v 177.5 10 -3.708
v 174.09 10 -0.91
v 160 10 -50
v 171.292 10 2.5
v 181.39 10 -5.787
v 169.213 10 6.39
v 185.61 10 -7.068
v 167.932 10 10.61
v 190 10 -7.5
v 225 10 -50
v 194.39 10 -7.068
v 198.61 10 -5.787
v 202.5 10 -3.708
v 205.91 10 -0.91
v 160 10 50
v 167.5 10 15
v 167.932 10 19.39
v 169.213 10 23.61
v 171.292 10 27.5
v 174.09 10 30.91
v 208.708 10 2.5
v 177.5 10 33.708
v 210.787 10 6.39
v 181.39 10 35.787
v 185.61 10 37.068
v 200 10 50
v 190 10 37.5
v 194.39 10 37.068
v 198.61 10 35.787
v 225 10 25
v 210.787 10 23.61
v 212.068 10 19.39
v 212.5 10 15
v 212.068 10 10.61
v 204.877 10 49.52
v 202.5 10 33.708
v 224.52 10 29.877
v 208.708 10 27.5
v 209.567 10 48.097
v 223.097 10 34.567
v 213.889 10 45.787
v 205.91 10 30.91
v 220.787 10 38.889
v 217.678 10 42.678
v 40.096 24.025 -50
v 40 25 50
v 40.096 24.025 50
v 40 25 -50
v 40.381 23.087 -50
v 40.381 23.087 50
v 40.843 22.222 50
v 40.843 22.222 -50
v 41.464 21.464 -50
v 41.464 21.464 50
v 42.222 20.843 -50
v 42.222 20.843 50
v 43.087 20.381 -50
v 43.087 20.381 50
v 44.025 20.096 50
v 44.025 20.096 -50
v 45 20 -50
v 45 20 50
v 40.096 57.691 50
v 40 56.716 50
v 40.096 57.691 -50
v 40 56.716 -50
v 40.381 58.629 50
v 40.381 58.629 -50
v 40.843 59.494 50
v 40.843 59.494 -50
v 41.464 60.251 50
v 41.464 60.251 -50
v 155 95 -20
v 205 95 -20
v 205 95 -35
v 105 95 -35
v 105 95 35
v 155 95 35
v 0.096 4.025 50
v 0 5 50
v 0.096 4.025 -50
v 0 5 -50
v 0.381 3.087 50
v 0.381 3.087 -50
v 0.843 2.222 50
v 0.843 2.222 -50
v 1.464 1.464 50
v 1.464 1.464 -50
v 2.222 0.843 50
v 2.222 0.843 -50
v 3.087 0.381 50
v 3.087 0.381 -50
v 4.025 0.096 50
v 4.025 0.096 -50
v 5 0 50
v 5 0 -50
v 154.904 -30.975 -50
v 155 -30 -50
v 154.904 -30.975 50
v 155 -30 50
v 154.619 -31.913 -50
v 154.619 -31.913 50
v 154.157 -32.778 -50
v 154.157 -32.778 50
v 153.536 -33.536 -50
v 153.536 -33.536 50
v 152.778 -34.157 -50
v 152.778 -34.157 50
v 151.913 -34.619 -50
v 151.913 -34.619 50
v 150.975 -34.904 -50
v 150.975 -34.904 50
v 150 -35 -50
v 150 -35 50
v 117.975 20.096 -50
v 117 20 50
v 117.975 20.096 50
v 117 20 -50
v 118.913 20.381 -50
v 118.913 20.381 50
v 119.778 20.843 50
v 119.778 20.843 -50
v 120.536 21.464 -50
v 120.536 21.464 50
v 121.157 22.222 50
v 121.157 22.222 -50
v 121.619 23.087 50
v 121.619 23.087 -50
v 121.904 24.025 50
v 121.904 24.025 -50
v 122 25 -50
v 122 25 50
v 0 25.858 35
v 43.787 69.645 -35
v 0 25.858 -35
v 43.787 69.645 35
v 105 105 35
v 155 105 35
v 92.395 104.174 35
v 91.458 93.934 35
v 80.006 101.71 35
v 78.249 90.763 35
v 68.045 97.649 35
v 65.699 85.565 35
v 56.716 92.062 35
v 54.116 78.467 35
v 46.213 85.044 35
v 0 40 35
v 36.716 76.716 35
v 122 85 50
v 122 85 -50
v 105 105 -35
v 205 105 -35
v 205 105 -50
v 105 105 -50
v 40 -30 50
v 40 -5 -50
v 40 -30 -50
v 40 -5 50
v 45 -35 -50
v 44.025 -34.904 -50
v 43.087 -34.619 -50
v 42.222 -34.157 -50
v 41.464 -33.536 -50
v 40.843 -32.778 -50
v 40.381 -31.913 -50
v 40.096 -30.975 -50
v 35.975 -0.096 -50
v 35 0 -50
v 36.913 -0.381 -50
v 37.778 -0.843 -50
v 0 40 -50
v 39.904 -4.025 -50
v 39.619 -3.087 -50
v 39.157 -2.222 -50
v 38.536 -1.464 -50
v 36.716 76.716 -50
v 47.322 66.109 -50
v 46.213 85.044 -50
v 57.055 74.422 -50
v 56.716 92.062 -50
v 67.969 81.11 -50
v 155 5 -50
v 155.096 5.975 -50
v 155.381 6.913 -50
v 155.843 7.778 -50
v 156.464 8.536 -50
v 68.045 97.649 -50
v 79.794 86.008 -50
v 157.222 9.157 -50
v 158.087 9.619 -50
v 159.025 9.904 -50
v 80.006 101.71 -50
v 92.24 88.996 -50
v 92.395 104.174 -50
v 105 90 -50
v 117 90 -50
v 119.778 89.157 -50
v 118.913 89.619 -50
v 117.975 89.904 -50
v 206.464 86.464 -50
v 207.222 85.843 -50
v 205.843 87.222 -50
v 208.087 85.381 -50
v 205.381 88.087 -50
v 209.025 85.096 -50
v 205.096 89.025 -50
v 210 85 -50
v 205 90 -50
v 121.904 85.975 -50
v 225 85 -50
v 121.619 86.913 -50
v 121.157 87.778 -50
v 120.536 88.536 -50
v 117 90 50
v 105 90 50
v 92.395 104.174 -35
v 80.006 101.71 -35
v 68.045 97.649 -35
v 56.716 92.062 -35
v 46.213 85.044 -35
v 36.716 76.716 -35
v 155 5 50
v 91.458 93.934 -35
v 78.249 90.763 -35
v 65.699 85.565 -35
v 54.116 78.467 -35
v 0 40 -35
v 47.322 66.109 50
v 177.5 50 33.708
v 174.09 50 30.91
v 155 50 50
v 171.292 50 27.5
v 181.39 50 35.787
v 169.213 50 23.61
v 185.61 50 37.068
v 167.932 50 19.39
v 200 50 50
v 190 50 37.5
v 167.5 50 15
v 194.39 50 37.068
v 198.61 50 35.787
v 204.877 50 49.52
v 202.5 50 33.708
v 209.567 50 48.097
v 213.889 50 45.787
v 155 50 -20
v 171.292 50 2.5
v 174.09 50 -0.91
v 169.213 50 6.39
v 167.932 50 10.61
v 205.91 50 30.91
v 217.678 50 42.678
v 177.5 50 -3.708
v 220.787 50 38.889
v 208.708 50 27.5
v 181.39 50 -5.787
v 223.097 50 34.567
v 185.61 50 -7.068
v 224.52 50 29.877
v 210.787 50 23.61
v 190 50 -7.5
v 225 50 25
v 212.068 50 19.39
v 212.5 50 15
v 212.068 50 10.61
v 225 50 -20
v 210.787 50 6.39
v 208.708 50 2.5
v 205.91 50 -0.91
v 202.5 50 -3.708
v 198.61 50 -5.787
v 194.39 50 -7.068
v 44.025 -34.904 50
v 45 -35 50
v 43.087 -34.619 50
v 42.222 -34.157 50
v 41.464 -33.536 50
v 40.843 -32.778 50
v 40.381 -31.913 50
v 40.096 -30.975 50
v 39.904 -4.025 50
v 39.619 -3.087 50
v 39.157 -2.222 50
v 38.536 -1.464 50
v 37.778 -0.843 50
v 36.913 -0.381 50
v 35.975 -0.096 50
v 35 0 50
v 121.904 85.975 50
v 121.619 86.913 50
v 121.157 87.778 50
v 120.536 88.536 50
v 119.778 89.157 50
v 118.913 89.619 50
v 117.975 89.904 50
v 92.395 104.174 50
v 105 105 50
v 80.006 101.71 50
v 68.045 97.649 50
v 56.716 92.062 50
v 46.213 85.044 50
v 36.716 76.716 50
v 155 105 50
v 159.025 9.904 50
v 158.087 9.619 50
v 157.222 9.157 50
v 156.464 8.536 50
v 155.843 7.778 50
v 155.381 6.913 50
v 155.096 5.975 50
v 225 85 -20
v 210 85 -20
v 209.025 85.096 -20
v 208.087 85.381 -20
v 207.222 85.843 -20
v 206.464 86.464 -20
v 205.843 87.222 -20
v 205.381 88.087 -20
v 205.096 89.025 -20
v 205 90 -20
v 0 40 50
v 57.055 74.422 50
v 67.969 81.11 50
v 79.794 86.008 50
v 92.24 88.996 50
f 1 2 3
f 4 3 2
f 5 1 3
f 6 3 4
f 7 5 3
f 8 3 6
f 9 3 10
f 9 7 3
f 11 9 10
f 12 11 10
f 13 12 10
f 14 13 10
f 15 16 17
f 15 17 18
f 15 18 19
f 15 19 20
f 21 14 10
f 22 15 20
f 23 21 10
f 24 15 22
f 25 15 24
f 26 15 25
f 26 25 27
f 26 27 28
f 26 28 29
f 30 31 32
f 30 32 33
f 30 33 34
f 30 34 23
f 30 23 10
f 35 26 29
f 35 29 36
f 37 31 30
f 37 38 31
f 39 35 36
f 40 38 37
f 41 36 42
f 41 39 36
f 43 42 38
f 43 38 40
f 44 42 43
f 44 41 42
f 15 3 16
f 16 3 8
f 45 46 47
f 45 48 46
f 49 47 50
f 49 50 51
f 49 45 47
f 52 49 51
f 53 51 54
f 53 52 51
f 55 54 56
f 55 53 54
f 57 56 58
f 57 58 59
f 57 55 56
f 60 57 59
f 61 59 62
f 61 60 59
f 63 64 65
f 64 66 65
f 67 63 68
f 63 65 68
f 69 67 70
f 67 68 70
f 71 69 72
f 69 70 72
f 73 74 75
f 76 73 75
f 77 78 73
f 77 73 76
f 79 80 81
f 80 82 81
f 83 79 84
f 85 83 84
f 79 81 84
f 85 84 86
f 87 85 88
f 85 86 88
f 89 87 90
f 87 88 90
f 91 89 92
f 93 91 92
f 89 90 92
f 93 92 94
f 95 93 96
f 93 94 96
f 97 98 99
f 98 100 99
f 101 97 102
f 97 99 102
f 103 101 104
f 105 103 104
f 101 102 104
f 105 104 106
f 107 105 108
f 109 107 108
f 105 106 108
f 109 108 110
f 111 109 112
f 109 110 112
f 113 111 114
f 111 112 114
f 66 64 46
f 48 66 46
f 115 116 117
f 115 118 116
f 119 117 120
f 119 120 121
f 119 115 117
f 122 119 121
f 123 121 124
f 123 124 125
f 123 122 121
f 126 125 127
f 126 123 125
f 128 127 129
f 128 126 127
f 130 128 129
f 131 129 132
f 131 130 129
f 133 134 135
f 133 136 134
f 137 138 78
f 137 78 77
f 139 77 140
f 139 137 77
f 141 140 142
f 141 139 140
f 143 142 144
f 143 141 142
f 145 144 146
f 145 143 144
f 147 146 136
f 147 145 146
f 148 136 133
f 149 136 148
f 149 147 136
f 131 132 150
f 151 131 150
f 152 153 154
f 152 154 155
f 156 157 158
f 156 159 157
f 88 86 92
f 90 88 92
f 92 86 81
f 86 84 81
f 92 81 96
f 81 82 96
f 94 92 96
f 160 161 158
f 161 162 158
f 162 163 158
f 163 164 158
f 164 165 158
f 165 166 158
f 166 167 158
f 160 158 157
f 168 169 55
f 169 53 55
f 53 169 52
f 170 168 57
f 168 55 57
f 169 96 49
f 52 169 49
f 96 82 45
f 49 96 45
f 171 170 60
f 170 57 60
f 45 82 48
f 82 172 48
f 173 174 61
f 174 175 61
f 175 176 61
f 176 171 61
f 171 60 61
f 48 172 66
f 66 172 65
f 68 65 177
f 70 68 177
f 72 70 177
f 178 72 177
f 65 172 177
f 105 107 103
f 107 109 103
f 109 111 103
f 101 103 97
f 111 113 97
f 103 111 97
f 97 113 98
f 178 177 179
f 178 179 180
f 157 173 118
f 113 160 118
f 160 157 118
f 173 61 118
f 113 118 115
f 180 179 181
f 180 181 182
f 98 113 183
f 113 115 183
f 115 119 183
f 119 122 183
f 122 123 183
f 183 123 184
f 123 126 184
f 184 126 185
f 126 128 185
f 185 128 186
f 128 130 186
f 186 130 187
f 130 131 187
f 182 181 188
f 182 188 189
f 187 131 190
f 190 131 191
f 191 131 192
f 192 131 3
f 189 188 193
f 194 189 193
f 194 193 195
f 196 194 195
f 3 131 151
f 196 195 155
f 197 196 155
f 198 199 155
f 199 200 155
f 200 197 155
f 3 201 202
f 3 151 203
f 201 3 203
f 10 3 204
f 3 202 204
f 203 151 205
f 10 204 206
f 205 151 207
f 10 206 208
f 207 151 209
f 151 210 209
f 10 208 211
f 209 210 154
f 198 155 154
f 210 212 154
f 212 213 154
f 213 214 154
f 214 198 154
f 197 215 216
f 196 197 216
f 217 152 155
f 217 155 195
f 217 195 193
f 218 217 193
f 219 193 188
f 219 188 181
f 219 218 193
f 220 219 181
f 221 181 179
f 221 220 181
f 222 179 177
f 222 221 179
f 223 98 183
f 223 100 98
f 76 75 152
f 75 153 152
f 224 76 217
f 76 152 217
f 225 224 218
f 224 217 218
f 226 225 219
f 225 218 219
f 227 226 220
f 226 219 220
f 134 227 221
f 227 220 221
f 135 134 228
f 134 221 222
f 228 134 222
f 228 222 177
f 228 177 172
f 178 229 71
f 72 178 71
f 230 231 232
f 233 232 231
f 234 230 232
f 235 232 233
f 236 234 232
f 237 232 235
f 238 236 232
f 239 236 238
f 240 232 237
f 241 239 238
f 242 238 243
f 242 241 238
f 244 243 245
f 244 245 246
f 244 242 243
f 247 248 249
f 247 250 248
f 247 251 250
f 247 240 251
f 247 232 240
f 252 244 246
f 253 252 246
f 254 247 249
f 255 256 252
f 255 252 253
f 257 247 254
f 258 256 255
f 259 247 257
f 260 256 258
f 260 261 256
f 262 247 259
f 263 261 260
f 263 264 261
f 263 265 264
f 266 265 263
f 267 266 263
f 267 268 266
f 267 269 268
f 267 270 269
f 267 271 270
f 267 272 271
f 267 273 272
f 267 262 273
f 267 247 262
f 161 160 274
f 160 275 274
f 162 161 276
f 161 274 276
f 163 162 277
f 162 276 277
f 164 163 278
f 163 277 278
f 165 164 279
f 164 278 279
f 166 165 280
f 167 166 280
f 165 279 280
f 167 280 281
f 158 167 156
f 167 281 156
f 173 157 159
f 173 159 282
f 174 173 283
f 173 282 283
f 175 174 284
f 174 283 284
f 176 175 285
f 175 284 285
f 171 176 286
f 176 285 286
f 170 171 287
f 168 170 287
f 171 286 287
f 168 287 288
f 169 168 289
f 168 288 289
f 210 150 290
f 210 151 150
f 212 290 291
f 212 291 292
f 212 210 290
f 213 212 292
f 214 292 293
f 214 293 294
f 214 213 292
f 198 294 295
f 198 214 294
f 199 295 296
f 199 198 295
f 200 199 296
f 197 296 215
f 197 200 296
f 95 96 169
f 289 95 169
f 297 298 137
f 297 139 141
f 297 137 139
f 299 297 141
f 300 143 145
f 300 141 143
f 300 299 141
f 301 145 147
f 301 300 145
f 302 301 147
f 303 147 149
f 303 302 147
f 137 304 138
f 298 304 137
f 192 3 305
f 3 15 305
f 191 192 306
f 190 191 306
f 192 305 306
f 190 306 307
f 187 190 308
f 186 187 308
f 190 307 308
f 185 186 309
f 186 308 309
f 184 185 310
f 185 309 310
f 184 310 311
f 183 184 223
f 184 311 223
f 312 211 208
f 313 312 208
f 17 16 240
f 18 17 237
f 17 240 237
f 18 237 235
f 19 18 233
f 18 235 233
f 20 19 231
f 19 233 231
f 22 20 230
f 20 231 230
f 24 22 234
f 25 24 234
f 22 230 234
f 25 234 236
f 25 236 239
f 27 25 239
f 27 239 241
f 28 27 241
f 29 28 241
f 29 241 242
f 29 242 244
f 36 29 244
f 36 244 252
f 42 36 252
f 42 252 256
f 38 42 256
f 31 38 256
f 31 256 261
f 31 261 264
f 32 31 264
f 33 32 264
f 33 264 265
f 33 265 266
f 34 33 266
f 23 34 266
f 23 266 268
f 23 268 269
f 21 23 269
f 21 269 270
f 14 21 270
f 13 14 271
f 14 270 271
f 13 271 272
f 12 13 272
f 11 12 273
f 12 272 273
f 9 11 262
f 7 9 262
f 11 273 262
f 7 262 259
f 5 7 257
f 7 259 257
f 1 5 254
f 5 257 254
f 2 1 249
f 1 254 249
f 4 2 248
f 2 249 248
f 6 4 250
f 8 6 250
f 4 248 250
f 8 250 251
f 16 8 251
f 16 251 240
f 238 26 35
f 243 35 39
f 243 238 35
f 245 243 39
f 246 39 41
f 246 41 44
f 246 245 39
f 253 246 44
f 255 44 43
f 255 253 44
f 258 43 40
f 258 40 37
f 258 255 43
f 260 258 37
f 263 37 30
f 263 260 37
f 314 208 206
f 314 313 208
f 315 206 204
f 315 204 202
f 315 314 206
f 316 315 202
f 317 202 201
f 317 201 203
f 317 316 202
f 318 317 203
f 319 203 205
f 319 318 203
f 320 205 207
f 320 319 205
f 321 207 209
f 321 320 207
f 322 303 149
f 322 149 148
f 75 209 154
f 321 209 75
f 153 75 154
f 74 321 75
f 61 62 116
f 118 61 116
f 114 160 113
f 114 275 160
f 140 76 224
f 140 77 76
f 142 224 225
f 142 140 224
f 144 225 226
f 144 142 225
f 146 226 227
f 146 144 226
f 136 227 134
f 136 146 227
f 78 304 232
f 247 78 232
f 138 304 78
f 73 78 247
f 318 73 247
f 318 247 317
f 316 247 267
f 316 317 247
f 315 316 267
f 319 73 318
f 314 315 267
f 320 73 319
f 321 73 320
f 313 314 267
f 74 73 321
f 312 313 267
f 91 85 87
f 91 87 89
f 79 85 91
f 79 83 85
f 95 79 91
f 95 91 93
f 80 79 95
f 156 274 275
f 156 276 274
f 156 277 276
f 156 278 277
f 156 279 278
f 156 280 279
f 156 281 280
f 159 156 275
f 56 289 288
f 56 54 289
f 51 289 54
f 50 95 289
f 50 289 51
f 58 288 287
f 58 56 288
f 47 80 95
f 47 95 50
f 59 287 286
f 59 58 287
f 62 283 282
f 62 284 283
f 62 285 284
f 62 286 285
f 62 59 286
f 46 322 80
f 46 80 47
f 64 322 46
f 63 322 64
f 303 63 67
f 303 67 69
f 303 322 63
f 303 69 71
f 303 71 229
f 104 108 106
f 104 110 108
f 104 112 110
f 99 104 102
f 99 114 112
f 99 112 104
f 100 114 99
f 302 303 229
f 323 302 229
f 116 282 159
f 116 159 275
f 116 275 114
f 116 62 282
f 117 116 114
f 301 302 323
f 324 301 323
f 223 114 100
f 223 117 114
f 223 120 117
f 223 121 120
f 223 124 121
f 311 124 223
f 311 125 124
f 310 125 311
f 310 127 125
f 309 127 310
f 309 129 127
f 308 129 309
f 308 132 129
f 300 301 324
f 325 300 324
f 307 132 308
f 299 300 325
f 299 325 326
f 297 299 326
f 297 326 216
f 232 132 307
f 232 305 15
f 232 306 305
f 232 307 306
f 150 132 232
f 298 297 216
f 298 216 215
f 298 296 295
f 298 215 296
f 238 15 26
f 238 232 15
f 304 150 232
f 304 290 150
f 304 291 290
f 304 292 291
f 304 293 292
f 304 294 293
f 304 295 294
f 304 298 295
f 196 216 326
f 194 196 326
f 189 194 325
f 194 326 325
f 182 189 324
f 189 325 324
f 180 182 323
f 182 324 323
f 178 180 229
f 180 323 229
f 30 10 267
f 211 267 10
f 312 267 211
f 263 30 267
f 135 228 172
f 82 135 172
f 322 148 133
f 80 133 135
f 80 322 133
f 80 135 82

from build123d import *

# Parameters (mm, degrees)
BOSS_EXTRUDE1_DEPTH = 50
CUT_EXTRUDE1_DEPTH  = 268.675176286
CUT_EXTRUDE3_DEPTH  = 35
SKETCH6_W           = 70
SKETCH6_H           = 70
CUT_EXTRUDE4_DEPTH  = 55
SKETCH7_R           = 22.5
CUT_EXTRUDE5_DEPTH  = 246.662369931
FILLET1_R           = 25
FILLET2_R           = 5
FILLET3_R           = 5


with BuildPart() as part:
    # Sketch1 → Boss-Extrude1 (new, symmetric)
    with BuildSketch(Plane.XY):
        with BuildLine():
            Line((0, 0), (40, 0))
            Line((40, 0), (40, -35))
            Line((40, -35), (155, -35))
            Line((155, -35), (155, 10))
            Line((155, 10), (225, 10))
            Line((225, 10), (225, 85))
            Line((225, 85), (205, 85))
            Line((205, 85), (205, 105))
            Line((205, 105), (105, 105))
            ThreePointArc((105, 105), (68.0448187, 97.649157401), (36.715728753, 76.715728753))
            Line((36.715728753, 76.715728753), (0, 40))
            Line((0, 40), (0, 0))
        make_face()
    extrude(amount=BOSS_EXTRUDE1_DEPTH, both=True)

    # Sketch2 → Cut-Extrude1 (cut, through all)
    with BuildSketch(Plane.XY.offset(50)):
        with BuildLine():
            Line((40, 58.786796564), (40, 20))
            Line((40, 20), (122, 20))
            Line((122, 20), (122, 90))
            Line((122, 90), (105, 90))
            ThreePointArc((105, 90), (73.785070185, 83.790964413), (47.32233047, 66.109127035))
            Line((47.32233047, 66.109127035), (40, 58.786796564))
        make_face()
    extrude(amount=-CUT_EXTRUDE1_DEPTH, mode=Mode.SUBTRACT)

    # Sketch5 → Cut-Extrude3 (cut, symmetric)
    with BuildSketch(Plane.XY):
        with BuildLine():
            Line((205, 95), (105, 95))
            ThreePointArc((105, 95), (71.871653023, 88.410362075), (43.786796564, 69.644660941))
            Line((43.786796564, 69.644660941), (0, 25.857864376))
            Line((0, 25.857864376), (0, 40))
            Line((0, 40), (36.715728753, 76.715728753))
            ThreePointArc((36.715728753, 76.715728753), (68.0448187, 97.649157401), (105, 105))
            Line((105, 105), (205, 105))
            Line((205, 105), (205, 95))
        make_face()
    extrude(amount=CUT_EXTRUDE3_DEPTH, both=True, mode=Mode.SUBTRACT)

    # Sketch6 → Cut-Extrude4 (cut)
    with BuildSketch(Plane(origin=(0, 105, 0), x_dir=(1, 0, 0), z_dir=(0, 1, 0))):
        with Locations((190, -15)):
            Rectangle(SKETCH6_W, SKETCH6_H)
    extrude(amount=-CUT_EXTRUDE4_DEPTH, mode=Mode.SUBTRACT)

    # Sketch7 → Cut-Extrude5 (cut, through all)
    with BuildSketch(Plane(origin=(0, 50, 0), x_dir=(1, 0, 0), z_dir=(0, 1, 0))):
        with Locations(Location((190, -15, 0), (0, 0, 180))):
            Circle(SKETCH7_R)
    extrude(amount=-CUT_EXTRUDE5_DEPTH, mode=Mode.SUBTRACT)

    # Fillet1
    fillet1_edges = [part.edges().sort_by_distance(p)[0] for p in [
        (225, 30, 50),
    ]]
    fillet(fillet1_edges, radius=FILLET1_R)

    # Fillet2
    fillet2_edges = [part.edges().sort_by_distance(p)[0] for p in [
        (155, 10, 0),
        (155, -35, 0),
        (40, -35, 0),
        (40, 0, 0),
        (0, 0, 0),
        (205, 85, -35),
    ]]
    fillet(fillet2_edges, radius=FILLET2_R)

    # Fillet3
    fillet3_edges = [part.edges().sort_by_distance(p)[0] for p in [
        (122, 90, 0),
        (122, 20, 0),
        (40, 20, 0),
        (40, 58.786796564, 0),
    ]]
    fillet(fillet3_edges, radius=FILLET3_R)


solid = part.part
